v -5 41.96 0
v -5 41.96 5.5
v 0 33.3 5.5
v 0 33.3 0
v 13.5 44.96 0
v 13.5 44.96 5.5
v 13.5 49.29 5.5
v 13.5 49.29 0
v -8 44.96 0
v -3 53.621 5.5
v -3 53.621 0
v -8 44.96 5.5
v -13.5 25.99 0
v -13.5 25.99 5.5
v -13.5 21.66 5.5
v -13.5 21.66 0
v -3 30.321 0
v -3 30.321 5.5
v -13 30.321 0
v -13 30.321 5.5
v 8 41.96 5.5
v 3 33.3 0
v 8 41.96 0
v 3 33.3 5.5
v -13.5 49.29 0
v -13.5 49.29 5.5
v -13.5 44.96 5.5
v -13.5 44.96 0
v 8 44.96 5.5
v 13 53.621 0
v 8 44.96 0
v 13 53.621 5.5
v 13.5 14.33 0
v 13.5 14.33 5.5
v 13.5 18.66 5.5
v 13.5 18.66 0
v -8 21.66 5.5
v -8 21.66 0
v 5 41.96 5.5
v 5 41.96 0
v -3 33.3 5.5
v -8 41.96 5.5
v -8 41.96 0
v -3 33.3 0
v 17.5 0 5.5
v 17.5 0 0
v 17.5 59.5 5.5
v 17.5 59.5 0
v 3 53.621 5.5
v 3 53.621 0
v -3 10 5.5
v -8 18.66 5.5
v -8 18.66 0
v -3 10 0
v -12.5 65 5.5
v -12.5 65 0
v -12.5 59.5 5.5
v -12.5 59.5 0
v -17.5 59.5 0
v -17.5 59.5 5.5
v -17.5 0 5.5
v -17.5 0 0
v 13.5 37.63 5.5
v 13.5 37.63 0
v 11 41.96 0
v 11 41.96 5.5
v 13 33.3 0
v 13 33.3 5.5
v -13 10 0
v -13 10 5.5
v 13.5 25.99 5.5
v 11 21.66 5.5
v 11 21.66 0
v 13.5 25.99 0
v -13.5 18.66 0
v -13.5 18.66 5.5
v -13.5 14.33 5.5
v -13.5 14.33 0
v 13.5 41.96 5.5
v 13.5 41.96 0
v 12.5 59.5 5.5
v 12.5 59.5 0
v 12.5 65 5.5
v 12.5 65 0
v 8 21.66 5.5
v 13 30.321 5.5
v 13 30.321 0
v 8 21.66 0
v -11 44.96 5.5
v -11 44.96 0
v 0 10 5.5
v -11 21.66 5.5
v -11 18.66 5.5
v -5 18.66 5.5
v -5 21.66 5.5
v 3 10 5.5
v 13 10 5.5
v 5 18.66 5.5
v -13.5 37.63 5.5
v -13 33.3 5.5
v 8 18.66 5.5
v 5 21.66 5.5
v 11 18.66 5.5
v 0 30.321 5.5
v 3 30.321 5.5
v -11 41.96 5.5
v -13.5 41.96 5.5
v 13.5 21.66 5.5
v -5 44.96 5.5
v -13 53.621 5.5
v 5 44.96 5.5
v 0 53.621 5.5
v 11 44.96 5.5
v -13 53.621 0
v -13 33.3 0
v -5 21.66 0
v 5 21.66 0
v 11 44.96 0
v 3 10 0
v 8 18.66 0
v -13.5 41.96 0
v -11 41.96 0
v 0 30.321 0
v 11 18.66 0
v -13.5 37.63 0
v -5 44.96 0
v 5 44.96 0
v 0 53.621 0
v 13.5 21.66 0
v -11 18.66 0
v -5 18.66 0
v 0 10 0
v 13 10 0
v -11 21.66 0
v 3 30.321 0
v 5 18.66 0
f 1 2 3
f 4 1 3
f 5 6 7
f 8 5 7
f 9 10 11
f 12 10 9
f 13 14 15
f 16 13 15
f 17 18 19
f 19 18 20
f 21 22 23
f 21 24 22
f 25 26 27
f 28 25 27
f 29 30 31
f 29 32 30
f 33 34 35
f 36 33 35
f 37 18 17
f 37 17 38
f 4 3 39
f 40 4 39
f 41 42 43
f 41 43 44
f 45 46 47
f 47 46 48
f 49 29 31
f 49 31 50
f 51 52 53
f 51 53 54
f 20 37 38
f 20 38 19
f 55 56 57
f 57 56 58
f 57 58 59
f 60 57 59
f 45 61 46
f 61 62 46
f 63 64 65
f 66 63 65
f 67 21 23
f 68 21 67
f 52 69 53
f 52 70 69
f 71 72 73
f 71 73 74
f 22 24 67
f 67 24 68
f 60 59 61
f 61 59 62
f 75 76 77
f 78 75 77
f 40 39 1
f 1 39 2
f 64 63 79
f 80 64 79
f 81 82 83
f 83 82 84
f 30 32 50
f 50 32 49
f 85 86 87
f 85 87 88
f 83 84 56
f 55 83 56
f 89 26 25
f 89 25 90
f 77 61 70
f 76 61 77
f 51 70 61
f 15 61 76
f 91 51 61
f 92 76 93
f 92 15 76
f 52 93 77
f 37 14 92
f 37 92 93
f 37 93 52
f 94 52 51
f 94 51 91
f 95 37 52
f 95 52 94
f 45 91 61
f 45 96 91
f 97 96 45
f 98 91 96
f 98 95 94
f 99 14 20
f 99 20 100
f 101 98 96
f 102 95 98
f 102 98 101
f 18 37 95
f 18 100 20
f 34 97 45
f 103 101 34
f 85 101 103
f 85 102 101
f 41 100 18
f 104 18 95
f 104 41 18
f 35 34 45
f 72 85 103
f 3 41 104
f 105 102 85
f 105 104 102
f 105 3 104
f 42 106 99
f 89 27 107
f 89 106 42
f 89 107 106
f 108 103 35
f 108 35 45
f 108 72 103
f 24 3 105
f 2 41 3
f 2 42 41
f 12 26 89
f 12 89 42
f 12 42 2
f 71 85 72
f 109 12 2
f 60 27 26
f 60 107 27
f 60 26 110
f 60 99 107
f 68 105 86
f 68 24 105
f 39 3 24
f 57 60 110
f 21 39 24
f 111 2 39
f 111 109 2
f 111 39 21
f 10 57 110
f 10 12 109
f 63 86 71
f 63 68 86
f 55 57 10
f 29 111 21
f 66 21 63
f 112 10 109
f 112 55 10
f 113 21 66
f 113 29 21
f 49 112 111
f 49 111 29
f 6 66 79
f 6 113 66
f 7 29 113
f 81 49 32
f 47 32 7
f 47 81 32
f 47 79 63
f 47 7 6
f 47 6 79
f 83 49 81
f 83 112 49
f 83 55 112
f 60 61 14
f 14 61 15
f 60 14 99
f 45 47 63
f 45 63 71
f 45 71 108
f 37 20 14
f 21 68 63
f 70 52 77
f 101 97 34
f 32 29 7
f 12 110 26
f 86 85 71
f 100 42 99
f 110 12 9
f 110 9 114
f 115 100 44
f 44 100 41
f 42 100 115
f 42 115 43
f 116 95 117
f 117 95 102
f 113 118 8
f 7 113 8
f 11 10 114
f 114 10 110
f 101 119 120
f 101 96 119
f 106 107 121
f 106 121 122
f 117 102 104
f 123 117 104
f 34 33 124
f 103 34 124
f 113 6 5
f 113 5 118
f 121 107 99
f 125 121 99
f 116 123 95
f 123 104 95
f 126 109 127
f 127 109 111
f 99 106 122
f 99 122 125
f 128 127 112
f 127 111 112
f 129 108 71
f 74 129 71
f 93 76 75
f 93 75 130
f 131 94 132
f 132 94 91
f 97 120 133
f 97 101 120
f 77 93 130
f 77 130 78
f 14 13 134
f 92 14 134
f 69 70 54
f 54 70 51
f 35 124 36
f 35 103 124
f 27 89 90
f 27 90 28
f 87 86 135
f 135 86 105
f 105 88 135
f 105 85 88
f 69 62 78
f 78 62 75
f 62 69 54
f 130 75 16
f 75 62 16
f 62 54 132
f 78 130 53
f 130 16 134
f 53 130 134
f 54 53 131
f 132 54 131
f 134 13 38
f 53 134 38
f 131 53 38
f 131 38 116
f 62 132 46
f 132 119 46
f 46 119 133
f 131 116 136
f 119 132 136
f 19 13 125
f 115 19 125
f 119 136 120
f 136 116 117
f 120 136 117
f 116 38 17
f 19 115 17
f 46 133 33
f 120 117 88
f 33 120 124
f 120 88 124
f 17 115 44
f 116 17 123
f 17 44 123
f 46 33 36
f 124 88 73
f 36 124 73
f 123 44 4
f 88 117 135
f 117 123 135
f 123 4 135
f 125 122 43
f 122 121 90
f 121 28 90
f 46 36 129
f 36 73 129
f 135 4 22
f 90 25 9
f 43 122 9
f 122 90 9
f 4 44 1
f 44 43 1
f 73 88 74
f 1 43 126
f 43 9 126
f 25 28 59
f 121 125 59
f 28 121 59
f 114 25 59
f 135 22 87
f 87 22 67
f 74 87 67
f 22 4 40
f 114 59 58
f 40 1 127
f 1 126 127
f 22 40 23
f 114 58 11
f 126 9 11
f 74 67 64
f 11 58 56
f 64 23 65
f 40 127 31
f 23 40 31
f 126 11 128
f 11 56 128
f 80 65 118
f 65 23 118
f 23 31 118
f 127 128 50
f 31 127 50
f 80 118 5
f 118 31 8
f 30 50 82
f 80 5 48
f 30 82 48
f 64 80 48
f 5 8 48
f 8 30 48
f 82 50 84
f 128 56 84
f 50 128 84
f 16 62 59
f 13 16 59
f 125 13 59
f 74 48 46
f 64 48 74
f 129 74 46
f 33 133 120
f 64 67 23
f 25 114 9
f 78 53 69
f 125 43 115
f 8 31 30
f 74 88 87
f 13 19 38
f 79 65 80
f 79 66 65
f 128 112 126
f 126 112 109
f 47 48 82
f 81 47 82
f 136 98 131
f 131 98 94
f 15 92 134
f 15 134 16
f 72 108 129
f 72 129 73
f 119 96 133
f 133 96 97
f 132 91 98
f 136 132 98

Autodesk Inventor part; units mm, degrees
ref_plane "YZ Plane" through (0, 0, 0) normal (1, 0, 0) x (0, 1, 0)
ref_plane "XZ Plane" through (0, 0, 0) normal (0, 1, 0) x (-1, 0, 0)
sketch "スケッチ1" plane through (0, 0, 0) normal (0, 0, 1) x (1, 0, 0)
  line L0 (-17.5, 0) -> (17.5, 0)
  line L1 (17.5, 0) -> (17.5, 59.5)
  line L2 (17.5, 59.5) -> (-17.5, 59.5)
  line L3 (-17.5, 59.5) -> (-17.5, 0)
  line L4 (-12.5, 59.5) -> (12.5, 59.5)
  line L5 (12.5, 59.5) -> (12.5, 65)
  line L6 (12.5, 65) -> (-12.5, 65)
  line L7 (-12.5, 65) -> (-12.5, 59.5)
  point P0 (0, 0)
  point P1 (0, 0)
  point P2 (0, 59.5)
  dimension "d0" = 59.5
  dimension "d1" = 35
  dimension "d2" = 25
  dimension "d3" = 5.5
extrude "押し出し1" add sketch "スケッチ1" along normal blind 5.5
sketch "スケッチ2" plane through (0, 0, 5.5) normal (0, 0, 1) x (1, 0, 0)
  line L0 (-13, 10) -> (-3, 10)
  line L1 (-13, 10) -> (-8, 18.6603)
  line L2 (-8, 18.6603) -> (-3, 10)
  line L3 (0, 10) -> (5, 18.6603)
  line L4 (5, 18.6603) -> (-5, 18.6603)
  line L5 (-5, 18.6603) -> (0, 10)
  line L6 (3, 10) -> (13, 10)
  line L7 (13, 10) -> (8, 18.6603)
  line L8 (8, 18.6603) -> (3, 10)
  line L9 (0, -13) -> (0, 78) projected
  line L10 (-17.5, 0) -> (17.5, 0) projected
  line L11 (-11, 18.6603) -> (-16, 10)
  line L12 (-16, 10) -> (-16, 18.6603)
  line L13 (-16, 18.6603) -> (-11, 18.6603)
  line L14 (-13.5, 18.6603) -> (-13.5, 10)
  point P0 (0, 0)
  point P1 (0, 18.6603)
  point P2 (-13.5, 14.3301)
  dimension "d6" = 10
  dimension "d7" = 3
  dimension "d8" = 10
  dimension "d9" = 3
extrude "押し出し2" cut sketch "スケッチ2" against normal through all contours L1 L2 L0 | L5 L4 L9 | L11 L14 L13
ref_plane "作業平面1" through (-5, 20.1603, 5.5) normal (0, -1, 0) x (1, 0, 0)
mirror "ミラー1" about plane through (-5, 20.1603, 5.5) normal (0, -1, 0) of "押し出し2"
pattern_linear "矩形状パターン1" count 2 spacing 23.3 along (0, 1, 0) of "押し出し2", "ミラー1"
mirror "ミラー2" about plane through (0, 0, 0) normal (1, 0, 0) of "押し出し2", "ミラー1", "矩形状パターン1"
equation "\"d9\" = d7"
properties part number "motor_setter_spacer"
